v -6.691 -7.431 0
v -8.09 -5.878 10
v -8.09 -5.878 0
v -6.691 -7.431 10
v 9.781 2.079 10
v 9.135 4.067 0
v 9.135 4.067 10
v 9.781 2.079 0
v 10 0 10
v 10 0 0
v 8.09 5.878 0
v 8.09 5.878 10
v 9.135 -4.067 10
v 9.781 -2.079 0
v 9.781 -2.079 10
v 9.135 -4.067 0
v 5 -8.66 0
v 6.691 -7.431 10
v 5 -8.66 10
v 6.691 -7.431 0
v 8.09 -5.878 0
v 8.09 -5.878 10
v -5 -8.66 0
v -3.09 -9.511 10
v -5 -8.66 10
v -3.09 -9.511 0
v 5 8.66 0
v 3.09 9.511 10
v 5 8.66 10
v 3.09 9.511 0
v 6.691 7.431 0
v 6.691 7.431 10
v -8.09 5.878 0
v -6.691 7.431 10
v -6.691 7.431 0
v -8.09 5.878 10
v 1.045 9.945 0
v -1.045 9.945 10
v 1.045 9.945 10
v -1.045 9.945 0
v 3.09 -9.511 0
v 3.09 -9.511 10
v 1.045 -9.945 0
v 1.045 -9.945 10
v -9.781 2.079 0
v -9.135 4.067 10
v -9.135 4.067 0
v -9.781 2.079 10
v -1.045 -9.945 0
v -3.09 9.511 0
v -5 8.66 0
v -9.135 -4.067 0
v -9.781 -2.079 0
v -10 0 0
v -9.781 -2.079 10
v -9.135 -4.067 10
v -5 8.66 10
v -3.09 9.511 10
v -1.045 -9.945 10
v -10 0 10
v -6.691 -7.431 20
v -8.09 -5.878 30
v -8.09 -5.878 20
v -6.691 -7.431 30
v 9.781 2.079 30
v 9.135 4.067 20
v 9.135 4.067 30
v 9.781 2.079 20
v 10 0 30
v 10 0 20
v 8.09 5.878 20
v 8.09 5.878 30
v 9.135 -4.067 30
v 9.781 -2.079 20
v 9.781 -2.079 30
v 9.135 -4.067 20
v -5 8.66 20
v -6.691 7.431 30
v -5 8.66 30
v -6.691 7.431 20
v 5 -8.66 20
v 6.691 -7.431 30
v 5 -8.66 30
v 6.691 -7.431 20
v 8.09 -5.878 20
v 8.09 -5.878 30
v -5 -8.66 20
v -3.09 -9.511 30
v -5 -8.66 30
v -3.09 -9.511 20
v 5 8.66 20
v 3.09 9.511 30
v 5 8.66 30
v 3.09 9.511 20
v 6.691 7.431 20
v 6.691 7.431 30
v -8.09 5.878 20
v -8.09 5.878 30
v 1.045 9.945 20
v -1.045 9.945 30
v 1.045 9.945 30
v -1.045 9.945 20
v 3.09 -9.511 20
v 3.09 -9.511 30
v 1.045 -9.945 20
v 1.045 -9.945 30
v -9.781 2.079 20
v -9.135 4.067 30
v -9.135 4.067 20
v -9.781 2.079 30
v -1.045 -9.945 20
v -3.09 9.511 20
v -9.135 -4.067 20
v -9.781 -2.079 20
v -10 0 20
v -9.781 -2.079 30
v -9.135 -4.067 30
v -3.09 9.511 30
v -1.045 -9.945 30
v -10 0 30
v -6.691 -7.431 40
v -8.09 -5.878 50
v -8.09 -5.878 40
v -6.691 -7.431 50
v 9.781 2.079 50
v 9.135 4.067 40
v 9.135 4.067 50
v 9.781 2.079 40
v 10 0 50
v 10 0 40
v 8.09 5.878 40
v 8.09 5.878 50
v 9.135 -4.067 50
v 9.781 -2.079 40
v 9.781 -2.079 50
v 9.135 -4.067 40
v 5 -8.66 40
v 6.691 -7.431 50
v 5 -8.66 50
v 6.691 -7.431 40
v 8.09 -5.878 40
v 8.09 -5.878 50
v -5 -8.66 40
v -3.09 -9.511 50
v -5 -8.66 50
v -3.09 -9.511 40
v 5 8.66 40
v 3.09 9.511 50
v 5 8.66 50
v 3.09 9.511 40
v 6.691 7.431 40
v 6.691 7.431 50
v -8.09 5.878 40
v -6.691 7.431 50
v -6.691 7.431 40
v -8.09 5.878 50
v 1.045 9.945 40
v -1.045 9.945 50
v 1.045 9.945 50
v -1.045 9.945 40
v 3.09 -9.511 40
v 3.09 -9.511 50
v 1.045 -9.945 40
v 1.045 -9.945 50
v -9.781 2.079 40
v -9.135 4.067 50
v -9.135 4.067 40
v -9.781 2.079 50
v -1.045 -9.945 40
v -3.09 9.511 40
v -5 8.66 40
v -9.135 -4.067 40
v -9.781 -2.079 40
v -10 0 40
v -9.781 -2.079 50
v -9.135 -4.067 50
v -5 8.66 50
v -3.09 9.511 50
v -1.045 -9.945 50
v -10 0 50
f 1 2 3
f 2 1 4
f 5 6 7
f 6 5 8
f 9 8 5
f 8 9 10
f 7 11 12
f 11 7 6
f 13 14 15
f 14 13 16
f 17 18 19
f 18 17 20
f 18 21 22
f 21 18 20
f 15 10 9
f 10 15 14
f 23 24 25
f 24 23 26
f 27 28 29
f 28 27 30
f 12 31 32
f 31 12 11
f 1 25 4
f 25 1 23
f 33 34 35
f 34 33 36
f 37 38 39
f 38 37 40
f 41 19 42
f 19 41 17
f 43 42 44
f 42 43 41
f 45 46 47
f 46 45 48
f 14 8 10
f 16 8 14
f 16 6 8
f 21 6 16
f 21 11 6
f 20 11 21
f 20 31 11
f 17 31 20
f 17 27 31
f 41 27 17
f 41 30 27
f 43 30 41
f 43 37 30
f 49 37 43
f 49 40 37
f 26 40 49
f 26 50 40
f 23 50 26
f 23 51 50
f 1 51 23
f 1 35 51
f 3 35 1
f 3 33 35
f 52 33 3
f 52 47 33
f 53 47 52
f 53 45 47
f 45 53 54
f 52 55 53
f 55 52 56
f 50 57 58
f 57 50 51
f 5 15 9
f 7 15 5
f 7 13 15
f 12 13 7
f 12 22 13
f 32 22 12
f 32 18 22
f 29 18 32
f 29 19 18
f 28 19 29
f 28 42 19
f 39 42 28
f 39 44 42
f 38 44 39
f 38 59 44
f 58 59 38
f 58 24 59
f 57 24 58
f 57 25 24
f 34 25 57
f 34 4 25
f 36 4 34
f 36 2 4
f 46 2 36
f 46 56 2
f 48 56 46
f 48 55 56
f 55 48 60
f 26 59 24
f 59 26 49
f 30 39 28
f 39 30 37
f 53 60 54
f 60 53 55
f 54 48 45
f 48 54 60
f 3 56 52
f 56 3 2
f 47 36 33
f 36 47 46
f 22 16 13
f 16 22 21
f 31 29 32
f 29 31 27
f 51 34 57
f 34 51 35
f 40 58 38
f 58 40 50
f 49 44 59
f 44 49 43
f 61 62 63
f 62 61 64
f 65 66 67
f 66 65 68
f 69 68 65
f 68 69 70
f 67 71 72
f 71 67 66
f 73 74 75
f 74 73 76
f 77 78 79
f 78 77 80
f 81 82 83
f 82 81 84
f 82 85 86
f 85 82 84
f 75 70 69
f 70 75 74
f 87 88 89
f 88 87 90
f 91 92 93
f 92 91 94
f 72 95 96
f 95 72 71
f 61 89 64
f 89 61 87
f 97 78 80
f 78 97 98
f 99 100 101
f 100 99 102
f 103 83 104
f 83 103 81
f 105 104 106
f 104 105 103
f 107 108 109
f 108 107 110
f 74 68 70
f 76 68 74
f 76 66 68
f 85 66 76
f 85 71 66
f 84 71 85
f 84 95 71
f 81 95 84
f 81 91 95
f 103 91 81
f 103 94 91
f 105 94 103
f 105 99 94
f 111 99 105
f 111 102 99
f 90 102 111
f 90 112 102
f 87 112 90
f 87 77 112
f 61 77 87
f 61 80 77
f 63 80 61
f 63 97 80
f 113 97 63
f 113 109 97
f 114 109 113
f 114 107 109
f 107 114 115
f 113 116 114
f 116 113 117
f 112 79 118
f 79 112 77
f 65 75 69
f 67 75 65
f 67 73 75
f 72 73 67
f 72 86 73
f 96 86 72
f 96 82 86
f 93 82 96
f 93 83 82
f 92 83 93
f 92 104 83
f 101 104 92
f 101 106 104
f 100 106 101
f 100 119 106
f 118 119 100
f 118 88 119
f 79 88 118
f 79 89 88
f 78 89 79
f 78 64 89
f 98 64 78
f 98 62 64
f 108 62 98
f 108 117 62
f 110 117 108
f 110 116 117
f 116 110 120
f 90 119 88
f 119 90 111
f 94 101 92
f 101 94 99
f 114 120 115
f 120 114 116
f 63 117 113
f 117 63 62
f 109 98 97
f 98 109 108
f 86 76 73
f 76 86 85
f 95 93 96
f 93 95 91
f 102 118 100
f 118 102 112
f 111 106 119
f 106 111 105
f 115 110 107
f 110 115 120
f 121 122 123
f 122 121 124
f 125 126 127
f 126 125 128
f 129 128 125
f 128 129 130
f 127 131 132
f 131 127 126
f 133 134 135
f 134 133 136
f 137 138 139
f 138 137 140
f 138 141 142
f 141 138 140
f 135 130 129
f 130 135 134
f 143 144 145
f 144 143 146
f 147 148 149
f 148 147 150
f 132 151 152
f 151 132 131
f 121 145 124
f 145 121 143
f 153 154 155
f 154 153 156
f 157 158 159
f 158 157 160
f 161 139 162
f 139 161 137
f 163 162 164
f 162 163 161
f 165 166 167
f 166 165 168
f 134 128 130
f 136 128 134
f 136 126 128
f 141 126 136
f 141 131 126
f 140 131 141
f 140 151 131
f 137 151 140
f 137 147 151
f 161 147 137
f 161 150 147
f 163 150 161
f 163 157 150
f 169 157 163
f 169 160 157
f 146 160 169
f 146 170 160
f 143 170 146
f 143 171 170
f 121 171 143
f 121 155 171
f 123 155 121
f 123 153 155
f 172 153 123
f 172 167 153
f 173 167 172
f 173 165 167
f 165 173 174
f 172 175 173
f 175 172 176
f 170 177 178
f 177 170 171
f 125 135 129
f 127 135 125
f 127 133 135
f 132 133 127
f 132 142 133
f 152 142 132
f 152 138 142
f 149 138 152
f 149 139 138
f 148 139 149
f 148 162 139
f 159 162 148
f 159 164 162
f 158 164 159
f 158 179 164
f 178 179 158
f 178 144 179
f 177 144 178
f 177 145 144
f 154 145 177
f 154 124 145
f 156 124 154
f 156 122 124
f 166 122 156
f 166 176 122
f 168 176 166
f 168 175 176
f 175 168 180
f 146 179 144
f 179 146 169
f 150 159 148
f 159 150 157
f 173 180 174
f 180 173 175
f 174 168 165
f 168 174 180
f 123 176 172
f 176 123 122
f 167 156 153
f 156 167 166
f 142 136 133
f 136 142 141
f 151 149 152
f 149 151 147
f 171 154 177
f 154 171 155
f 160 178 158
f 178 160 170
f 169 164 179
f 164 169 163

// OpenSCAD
for ( z=[0,20,40] ){
    translate([0,0,z]){
        cylinder(r=10,h=10);
    }
}  //zは0, 20, 40
